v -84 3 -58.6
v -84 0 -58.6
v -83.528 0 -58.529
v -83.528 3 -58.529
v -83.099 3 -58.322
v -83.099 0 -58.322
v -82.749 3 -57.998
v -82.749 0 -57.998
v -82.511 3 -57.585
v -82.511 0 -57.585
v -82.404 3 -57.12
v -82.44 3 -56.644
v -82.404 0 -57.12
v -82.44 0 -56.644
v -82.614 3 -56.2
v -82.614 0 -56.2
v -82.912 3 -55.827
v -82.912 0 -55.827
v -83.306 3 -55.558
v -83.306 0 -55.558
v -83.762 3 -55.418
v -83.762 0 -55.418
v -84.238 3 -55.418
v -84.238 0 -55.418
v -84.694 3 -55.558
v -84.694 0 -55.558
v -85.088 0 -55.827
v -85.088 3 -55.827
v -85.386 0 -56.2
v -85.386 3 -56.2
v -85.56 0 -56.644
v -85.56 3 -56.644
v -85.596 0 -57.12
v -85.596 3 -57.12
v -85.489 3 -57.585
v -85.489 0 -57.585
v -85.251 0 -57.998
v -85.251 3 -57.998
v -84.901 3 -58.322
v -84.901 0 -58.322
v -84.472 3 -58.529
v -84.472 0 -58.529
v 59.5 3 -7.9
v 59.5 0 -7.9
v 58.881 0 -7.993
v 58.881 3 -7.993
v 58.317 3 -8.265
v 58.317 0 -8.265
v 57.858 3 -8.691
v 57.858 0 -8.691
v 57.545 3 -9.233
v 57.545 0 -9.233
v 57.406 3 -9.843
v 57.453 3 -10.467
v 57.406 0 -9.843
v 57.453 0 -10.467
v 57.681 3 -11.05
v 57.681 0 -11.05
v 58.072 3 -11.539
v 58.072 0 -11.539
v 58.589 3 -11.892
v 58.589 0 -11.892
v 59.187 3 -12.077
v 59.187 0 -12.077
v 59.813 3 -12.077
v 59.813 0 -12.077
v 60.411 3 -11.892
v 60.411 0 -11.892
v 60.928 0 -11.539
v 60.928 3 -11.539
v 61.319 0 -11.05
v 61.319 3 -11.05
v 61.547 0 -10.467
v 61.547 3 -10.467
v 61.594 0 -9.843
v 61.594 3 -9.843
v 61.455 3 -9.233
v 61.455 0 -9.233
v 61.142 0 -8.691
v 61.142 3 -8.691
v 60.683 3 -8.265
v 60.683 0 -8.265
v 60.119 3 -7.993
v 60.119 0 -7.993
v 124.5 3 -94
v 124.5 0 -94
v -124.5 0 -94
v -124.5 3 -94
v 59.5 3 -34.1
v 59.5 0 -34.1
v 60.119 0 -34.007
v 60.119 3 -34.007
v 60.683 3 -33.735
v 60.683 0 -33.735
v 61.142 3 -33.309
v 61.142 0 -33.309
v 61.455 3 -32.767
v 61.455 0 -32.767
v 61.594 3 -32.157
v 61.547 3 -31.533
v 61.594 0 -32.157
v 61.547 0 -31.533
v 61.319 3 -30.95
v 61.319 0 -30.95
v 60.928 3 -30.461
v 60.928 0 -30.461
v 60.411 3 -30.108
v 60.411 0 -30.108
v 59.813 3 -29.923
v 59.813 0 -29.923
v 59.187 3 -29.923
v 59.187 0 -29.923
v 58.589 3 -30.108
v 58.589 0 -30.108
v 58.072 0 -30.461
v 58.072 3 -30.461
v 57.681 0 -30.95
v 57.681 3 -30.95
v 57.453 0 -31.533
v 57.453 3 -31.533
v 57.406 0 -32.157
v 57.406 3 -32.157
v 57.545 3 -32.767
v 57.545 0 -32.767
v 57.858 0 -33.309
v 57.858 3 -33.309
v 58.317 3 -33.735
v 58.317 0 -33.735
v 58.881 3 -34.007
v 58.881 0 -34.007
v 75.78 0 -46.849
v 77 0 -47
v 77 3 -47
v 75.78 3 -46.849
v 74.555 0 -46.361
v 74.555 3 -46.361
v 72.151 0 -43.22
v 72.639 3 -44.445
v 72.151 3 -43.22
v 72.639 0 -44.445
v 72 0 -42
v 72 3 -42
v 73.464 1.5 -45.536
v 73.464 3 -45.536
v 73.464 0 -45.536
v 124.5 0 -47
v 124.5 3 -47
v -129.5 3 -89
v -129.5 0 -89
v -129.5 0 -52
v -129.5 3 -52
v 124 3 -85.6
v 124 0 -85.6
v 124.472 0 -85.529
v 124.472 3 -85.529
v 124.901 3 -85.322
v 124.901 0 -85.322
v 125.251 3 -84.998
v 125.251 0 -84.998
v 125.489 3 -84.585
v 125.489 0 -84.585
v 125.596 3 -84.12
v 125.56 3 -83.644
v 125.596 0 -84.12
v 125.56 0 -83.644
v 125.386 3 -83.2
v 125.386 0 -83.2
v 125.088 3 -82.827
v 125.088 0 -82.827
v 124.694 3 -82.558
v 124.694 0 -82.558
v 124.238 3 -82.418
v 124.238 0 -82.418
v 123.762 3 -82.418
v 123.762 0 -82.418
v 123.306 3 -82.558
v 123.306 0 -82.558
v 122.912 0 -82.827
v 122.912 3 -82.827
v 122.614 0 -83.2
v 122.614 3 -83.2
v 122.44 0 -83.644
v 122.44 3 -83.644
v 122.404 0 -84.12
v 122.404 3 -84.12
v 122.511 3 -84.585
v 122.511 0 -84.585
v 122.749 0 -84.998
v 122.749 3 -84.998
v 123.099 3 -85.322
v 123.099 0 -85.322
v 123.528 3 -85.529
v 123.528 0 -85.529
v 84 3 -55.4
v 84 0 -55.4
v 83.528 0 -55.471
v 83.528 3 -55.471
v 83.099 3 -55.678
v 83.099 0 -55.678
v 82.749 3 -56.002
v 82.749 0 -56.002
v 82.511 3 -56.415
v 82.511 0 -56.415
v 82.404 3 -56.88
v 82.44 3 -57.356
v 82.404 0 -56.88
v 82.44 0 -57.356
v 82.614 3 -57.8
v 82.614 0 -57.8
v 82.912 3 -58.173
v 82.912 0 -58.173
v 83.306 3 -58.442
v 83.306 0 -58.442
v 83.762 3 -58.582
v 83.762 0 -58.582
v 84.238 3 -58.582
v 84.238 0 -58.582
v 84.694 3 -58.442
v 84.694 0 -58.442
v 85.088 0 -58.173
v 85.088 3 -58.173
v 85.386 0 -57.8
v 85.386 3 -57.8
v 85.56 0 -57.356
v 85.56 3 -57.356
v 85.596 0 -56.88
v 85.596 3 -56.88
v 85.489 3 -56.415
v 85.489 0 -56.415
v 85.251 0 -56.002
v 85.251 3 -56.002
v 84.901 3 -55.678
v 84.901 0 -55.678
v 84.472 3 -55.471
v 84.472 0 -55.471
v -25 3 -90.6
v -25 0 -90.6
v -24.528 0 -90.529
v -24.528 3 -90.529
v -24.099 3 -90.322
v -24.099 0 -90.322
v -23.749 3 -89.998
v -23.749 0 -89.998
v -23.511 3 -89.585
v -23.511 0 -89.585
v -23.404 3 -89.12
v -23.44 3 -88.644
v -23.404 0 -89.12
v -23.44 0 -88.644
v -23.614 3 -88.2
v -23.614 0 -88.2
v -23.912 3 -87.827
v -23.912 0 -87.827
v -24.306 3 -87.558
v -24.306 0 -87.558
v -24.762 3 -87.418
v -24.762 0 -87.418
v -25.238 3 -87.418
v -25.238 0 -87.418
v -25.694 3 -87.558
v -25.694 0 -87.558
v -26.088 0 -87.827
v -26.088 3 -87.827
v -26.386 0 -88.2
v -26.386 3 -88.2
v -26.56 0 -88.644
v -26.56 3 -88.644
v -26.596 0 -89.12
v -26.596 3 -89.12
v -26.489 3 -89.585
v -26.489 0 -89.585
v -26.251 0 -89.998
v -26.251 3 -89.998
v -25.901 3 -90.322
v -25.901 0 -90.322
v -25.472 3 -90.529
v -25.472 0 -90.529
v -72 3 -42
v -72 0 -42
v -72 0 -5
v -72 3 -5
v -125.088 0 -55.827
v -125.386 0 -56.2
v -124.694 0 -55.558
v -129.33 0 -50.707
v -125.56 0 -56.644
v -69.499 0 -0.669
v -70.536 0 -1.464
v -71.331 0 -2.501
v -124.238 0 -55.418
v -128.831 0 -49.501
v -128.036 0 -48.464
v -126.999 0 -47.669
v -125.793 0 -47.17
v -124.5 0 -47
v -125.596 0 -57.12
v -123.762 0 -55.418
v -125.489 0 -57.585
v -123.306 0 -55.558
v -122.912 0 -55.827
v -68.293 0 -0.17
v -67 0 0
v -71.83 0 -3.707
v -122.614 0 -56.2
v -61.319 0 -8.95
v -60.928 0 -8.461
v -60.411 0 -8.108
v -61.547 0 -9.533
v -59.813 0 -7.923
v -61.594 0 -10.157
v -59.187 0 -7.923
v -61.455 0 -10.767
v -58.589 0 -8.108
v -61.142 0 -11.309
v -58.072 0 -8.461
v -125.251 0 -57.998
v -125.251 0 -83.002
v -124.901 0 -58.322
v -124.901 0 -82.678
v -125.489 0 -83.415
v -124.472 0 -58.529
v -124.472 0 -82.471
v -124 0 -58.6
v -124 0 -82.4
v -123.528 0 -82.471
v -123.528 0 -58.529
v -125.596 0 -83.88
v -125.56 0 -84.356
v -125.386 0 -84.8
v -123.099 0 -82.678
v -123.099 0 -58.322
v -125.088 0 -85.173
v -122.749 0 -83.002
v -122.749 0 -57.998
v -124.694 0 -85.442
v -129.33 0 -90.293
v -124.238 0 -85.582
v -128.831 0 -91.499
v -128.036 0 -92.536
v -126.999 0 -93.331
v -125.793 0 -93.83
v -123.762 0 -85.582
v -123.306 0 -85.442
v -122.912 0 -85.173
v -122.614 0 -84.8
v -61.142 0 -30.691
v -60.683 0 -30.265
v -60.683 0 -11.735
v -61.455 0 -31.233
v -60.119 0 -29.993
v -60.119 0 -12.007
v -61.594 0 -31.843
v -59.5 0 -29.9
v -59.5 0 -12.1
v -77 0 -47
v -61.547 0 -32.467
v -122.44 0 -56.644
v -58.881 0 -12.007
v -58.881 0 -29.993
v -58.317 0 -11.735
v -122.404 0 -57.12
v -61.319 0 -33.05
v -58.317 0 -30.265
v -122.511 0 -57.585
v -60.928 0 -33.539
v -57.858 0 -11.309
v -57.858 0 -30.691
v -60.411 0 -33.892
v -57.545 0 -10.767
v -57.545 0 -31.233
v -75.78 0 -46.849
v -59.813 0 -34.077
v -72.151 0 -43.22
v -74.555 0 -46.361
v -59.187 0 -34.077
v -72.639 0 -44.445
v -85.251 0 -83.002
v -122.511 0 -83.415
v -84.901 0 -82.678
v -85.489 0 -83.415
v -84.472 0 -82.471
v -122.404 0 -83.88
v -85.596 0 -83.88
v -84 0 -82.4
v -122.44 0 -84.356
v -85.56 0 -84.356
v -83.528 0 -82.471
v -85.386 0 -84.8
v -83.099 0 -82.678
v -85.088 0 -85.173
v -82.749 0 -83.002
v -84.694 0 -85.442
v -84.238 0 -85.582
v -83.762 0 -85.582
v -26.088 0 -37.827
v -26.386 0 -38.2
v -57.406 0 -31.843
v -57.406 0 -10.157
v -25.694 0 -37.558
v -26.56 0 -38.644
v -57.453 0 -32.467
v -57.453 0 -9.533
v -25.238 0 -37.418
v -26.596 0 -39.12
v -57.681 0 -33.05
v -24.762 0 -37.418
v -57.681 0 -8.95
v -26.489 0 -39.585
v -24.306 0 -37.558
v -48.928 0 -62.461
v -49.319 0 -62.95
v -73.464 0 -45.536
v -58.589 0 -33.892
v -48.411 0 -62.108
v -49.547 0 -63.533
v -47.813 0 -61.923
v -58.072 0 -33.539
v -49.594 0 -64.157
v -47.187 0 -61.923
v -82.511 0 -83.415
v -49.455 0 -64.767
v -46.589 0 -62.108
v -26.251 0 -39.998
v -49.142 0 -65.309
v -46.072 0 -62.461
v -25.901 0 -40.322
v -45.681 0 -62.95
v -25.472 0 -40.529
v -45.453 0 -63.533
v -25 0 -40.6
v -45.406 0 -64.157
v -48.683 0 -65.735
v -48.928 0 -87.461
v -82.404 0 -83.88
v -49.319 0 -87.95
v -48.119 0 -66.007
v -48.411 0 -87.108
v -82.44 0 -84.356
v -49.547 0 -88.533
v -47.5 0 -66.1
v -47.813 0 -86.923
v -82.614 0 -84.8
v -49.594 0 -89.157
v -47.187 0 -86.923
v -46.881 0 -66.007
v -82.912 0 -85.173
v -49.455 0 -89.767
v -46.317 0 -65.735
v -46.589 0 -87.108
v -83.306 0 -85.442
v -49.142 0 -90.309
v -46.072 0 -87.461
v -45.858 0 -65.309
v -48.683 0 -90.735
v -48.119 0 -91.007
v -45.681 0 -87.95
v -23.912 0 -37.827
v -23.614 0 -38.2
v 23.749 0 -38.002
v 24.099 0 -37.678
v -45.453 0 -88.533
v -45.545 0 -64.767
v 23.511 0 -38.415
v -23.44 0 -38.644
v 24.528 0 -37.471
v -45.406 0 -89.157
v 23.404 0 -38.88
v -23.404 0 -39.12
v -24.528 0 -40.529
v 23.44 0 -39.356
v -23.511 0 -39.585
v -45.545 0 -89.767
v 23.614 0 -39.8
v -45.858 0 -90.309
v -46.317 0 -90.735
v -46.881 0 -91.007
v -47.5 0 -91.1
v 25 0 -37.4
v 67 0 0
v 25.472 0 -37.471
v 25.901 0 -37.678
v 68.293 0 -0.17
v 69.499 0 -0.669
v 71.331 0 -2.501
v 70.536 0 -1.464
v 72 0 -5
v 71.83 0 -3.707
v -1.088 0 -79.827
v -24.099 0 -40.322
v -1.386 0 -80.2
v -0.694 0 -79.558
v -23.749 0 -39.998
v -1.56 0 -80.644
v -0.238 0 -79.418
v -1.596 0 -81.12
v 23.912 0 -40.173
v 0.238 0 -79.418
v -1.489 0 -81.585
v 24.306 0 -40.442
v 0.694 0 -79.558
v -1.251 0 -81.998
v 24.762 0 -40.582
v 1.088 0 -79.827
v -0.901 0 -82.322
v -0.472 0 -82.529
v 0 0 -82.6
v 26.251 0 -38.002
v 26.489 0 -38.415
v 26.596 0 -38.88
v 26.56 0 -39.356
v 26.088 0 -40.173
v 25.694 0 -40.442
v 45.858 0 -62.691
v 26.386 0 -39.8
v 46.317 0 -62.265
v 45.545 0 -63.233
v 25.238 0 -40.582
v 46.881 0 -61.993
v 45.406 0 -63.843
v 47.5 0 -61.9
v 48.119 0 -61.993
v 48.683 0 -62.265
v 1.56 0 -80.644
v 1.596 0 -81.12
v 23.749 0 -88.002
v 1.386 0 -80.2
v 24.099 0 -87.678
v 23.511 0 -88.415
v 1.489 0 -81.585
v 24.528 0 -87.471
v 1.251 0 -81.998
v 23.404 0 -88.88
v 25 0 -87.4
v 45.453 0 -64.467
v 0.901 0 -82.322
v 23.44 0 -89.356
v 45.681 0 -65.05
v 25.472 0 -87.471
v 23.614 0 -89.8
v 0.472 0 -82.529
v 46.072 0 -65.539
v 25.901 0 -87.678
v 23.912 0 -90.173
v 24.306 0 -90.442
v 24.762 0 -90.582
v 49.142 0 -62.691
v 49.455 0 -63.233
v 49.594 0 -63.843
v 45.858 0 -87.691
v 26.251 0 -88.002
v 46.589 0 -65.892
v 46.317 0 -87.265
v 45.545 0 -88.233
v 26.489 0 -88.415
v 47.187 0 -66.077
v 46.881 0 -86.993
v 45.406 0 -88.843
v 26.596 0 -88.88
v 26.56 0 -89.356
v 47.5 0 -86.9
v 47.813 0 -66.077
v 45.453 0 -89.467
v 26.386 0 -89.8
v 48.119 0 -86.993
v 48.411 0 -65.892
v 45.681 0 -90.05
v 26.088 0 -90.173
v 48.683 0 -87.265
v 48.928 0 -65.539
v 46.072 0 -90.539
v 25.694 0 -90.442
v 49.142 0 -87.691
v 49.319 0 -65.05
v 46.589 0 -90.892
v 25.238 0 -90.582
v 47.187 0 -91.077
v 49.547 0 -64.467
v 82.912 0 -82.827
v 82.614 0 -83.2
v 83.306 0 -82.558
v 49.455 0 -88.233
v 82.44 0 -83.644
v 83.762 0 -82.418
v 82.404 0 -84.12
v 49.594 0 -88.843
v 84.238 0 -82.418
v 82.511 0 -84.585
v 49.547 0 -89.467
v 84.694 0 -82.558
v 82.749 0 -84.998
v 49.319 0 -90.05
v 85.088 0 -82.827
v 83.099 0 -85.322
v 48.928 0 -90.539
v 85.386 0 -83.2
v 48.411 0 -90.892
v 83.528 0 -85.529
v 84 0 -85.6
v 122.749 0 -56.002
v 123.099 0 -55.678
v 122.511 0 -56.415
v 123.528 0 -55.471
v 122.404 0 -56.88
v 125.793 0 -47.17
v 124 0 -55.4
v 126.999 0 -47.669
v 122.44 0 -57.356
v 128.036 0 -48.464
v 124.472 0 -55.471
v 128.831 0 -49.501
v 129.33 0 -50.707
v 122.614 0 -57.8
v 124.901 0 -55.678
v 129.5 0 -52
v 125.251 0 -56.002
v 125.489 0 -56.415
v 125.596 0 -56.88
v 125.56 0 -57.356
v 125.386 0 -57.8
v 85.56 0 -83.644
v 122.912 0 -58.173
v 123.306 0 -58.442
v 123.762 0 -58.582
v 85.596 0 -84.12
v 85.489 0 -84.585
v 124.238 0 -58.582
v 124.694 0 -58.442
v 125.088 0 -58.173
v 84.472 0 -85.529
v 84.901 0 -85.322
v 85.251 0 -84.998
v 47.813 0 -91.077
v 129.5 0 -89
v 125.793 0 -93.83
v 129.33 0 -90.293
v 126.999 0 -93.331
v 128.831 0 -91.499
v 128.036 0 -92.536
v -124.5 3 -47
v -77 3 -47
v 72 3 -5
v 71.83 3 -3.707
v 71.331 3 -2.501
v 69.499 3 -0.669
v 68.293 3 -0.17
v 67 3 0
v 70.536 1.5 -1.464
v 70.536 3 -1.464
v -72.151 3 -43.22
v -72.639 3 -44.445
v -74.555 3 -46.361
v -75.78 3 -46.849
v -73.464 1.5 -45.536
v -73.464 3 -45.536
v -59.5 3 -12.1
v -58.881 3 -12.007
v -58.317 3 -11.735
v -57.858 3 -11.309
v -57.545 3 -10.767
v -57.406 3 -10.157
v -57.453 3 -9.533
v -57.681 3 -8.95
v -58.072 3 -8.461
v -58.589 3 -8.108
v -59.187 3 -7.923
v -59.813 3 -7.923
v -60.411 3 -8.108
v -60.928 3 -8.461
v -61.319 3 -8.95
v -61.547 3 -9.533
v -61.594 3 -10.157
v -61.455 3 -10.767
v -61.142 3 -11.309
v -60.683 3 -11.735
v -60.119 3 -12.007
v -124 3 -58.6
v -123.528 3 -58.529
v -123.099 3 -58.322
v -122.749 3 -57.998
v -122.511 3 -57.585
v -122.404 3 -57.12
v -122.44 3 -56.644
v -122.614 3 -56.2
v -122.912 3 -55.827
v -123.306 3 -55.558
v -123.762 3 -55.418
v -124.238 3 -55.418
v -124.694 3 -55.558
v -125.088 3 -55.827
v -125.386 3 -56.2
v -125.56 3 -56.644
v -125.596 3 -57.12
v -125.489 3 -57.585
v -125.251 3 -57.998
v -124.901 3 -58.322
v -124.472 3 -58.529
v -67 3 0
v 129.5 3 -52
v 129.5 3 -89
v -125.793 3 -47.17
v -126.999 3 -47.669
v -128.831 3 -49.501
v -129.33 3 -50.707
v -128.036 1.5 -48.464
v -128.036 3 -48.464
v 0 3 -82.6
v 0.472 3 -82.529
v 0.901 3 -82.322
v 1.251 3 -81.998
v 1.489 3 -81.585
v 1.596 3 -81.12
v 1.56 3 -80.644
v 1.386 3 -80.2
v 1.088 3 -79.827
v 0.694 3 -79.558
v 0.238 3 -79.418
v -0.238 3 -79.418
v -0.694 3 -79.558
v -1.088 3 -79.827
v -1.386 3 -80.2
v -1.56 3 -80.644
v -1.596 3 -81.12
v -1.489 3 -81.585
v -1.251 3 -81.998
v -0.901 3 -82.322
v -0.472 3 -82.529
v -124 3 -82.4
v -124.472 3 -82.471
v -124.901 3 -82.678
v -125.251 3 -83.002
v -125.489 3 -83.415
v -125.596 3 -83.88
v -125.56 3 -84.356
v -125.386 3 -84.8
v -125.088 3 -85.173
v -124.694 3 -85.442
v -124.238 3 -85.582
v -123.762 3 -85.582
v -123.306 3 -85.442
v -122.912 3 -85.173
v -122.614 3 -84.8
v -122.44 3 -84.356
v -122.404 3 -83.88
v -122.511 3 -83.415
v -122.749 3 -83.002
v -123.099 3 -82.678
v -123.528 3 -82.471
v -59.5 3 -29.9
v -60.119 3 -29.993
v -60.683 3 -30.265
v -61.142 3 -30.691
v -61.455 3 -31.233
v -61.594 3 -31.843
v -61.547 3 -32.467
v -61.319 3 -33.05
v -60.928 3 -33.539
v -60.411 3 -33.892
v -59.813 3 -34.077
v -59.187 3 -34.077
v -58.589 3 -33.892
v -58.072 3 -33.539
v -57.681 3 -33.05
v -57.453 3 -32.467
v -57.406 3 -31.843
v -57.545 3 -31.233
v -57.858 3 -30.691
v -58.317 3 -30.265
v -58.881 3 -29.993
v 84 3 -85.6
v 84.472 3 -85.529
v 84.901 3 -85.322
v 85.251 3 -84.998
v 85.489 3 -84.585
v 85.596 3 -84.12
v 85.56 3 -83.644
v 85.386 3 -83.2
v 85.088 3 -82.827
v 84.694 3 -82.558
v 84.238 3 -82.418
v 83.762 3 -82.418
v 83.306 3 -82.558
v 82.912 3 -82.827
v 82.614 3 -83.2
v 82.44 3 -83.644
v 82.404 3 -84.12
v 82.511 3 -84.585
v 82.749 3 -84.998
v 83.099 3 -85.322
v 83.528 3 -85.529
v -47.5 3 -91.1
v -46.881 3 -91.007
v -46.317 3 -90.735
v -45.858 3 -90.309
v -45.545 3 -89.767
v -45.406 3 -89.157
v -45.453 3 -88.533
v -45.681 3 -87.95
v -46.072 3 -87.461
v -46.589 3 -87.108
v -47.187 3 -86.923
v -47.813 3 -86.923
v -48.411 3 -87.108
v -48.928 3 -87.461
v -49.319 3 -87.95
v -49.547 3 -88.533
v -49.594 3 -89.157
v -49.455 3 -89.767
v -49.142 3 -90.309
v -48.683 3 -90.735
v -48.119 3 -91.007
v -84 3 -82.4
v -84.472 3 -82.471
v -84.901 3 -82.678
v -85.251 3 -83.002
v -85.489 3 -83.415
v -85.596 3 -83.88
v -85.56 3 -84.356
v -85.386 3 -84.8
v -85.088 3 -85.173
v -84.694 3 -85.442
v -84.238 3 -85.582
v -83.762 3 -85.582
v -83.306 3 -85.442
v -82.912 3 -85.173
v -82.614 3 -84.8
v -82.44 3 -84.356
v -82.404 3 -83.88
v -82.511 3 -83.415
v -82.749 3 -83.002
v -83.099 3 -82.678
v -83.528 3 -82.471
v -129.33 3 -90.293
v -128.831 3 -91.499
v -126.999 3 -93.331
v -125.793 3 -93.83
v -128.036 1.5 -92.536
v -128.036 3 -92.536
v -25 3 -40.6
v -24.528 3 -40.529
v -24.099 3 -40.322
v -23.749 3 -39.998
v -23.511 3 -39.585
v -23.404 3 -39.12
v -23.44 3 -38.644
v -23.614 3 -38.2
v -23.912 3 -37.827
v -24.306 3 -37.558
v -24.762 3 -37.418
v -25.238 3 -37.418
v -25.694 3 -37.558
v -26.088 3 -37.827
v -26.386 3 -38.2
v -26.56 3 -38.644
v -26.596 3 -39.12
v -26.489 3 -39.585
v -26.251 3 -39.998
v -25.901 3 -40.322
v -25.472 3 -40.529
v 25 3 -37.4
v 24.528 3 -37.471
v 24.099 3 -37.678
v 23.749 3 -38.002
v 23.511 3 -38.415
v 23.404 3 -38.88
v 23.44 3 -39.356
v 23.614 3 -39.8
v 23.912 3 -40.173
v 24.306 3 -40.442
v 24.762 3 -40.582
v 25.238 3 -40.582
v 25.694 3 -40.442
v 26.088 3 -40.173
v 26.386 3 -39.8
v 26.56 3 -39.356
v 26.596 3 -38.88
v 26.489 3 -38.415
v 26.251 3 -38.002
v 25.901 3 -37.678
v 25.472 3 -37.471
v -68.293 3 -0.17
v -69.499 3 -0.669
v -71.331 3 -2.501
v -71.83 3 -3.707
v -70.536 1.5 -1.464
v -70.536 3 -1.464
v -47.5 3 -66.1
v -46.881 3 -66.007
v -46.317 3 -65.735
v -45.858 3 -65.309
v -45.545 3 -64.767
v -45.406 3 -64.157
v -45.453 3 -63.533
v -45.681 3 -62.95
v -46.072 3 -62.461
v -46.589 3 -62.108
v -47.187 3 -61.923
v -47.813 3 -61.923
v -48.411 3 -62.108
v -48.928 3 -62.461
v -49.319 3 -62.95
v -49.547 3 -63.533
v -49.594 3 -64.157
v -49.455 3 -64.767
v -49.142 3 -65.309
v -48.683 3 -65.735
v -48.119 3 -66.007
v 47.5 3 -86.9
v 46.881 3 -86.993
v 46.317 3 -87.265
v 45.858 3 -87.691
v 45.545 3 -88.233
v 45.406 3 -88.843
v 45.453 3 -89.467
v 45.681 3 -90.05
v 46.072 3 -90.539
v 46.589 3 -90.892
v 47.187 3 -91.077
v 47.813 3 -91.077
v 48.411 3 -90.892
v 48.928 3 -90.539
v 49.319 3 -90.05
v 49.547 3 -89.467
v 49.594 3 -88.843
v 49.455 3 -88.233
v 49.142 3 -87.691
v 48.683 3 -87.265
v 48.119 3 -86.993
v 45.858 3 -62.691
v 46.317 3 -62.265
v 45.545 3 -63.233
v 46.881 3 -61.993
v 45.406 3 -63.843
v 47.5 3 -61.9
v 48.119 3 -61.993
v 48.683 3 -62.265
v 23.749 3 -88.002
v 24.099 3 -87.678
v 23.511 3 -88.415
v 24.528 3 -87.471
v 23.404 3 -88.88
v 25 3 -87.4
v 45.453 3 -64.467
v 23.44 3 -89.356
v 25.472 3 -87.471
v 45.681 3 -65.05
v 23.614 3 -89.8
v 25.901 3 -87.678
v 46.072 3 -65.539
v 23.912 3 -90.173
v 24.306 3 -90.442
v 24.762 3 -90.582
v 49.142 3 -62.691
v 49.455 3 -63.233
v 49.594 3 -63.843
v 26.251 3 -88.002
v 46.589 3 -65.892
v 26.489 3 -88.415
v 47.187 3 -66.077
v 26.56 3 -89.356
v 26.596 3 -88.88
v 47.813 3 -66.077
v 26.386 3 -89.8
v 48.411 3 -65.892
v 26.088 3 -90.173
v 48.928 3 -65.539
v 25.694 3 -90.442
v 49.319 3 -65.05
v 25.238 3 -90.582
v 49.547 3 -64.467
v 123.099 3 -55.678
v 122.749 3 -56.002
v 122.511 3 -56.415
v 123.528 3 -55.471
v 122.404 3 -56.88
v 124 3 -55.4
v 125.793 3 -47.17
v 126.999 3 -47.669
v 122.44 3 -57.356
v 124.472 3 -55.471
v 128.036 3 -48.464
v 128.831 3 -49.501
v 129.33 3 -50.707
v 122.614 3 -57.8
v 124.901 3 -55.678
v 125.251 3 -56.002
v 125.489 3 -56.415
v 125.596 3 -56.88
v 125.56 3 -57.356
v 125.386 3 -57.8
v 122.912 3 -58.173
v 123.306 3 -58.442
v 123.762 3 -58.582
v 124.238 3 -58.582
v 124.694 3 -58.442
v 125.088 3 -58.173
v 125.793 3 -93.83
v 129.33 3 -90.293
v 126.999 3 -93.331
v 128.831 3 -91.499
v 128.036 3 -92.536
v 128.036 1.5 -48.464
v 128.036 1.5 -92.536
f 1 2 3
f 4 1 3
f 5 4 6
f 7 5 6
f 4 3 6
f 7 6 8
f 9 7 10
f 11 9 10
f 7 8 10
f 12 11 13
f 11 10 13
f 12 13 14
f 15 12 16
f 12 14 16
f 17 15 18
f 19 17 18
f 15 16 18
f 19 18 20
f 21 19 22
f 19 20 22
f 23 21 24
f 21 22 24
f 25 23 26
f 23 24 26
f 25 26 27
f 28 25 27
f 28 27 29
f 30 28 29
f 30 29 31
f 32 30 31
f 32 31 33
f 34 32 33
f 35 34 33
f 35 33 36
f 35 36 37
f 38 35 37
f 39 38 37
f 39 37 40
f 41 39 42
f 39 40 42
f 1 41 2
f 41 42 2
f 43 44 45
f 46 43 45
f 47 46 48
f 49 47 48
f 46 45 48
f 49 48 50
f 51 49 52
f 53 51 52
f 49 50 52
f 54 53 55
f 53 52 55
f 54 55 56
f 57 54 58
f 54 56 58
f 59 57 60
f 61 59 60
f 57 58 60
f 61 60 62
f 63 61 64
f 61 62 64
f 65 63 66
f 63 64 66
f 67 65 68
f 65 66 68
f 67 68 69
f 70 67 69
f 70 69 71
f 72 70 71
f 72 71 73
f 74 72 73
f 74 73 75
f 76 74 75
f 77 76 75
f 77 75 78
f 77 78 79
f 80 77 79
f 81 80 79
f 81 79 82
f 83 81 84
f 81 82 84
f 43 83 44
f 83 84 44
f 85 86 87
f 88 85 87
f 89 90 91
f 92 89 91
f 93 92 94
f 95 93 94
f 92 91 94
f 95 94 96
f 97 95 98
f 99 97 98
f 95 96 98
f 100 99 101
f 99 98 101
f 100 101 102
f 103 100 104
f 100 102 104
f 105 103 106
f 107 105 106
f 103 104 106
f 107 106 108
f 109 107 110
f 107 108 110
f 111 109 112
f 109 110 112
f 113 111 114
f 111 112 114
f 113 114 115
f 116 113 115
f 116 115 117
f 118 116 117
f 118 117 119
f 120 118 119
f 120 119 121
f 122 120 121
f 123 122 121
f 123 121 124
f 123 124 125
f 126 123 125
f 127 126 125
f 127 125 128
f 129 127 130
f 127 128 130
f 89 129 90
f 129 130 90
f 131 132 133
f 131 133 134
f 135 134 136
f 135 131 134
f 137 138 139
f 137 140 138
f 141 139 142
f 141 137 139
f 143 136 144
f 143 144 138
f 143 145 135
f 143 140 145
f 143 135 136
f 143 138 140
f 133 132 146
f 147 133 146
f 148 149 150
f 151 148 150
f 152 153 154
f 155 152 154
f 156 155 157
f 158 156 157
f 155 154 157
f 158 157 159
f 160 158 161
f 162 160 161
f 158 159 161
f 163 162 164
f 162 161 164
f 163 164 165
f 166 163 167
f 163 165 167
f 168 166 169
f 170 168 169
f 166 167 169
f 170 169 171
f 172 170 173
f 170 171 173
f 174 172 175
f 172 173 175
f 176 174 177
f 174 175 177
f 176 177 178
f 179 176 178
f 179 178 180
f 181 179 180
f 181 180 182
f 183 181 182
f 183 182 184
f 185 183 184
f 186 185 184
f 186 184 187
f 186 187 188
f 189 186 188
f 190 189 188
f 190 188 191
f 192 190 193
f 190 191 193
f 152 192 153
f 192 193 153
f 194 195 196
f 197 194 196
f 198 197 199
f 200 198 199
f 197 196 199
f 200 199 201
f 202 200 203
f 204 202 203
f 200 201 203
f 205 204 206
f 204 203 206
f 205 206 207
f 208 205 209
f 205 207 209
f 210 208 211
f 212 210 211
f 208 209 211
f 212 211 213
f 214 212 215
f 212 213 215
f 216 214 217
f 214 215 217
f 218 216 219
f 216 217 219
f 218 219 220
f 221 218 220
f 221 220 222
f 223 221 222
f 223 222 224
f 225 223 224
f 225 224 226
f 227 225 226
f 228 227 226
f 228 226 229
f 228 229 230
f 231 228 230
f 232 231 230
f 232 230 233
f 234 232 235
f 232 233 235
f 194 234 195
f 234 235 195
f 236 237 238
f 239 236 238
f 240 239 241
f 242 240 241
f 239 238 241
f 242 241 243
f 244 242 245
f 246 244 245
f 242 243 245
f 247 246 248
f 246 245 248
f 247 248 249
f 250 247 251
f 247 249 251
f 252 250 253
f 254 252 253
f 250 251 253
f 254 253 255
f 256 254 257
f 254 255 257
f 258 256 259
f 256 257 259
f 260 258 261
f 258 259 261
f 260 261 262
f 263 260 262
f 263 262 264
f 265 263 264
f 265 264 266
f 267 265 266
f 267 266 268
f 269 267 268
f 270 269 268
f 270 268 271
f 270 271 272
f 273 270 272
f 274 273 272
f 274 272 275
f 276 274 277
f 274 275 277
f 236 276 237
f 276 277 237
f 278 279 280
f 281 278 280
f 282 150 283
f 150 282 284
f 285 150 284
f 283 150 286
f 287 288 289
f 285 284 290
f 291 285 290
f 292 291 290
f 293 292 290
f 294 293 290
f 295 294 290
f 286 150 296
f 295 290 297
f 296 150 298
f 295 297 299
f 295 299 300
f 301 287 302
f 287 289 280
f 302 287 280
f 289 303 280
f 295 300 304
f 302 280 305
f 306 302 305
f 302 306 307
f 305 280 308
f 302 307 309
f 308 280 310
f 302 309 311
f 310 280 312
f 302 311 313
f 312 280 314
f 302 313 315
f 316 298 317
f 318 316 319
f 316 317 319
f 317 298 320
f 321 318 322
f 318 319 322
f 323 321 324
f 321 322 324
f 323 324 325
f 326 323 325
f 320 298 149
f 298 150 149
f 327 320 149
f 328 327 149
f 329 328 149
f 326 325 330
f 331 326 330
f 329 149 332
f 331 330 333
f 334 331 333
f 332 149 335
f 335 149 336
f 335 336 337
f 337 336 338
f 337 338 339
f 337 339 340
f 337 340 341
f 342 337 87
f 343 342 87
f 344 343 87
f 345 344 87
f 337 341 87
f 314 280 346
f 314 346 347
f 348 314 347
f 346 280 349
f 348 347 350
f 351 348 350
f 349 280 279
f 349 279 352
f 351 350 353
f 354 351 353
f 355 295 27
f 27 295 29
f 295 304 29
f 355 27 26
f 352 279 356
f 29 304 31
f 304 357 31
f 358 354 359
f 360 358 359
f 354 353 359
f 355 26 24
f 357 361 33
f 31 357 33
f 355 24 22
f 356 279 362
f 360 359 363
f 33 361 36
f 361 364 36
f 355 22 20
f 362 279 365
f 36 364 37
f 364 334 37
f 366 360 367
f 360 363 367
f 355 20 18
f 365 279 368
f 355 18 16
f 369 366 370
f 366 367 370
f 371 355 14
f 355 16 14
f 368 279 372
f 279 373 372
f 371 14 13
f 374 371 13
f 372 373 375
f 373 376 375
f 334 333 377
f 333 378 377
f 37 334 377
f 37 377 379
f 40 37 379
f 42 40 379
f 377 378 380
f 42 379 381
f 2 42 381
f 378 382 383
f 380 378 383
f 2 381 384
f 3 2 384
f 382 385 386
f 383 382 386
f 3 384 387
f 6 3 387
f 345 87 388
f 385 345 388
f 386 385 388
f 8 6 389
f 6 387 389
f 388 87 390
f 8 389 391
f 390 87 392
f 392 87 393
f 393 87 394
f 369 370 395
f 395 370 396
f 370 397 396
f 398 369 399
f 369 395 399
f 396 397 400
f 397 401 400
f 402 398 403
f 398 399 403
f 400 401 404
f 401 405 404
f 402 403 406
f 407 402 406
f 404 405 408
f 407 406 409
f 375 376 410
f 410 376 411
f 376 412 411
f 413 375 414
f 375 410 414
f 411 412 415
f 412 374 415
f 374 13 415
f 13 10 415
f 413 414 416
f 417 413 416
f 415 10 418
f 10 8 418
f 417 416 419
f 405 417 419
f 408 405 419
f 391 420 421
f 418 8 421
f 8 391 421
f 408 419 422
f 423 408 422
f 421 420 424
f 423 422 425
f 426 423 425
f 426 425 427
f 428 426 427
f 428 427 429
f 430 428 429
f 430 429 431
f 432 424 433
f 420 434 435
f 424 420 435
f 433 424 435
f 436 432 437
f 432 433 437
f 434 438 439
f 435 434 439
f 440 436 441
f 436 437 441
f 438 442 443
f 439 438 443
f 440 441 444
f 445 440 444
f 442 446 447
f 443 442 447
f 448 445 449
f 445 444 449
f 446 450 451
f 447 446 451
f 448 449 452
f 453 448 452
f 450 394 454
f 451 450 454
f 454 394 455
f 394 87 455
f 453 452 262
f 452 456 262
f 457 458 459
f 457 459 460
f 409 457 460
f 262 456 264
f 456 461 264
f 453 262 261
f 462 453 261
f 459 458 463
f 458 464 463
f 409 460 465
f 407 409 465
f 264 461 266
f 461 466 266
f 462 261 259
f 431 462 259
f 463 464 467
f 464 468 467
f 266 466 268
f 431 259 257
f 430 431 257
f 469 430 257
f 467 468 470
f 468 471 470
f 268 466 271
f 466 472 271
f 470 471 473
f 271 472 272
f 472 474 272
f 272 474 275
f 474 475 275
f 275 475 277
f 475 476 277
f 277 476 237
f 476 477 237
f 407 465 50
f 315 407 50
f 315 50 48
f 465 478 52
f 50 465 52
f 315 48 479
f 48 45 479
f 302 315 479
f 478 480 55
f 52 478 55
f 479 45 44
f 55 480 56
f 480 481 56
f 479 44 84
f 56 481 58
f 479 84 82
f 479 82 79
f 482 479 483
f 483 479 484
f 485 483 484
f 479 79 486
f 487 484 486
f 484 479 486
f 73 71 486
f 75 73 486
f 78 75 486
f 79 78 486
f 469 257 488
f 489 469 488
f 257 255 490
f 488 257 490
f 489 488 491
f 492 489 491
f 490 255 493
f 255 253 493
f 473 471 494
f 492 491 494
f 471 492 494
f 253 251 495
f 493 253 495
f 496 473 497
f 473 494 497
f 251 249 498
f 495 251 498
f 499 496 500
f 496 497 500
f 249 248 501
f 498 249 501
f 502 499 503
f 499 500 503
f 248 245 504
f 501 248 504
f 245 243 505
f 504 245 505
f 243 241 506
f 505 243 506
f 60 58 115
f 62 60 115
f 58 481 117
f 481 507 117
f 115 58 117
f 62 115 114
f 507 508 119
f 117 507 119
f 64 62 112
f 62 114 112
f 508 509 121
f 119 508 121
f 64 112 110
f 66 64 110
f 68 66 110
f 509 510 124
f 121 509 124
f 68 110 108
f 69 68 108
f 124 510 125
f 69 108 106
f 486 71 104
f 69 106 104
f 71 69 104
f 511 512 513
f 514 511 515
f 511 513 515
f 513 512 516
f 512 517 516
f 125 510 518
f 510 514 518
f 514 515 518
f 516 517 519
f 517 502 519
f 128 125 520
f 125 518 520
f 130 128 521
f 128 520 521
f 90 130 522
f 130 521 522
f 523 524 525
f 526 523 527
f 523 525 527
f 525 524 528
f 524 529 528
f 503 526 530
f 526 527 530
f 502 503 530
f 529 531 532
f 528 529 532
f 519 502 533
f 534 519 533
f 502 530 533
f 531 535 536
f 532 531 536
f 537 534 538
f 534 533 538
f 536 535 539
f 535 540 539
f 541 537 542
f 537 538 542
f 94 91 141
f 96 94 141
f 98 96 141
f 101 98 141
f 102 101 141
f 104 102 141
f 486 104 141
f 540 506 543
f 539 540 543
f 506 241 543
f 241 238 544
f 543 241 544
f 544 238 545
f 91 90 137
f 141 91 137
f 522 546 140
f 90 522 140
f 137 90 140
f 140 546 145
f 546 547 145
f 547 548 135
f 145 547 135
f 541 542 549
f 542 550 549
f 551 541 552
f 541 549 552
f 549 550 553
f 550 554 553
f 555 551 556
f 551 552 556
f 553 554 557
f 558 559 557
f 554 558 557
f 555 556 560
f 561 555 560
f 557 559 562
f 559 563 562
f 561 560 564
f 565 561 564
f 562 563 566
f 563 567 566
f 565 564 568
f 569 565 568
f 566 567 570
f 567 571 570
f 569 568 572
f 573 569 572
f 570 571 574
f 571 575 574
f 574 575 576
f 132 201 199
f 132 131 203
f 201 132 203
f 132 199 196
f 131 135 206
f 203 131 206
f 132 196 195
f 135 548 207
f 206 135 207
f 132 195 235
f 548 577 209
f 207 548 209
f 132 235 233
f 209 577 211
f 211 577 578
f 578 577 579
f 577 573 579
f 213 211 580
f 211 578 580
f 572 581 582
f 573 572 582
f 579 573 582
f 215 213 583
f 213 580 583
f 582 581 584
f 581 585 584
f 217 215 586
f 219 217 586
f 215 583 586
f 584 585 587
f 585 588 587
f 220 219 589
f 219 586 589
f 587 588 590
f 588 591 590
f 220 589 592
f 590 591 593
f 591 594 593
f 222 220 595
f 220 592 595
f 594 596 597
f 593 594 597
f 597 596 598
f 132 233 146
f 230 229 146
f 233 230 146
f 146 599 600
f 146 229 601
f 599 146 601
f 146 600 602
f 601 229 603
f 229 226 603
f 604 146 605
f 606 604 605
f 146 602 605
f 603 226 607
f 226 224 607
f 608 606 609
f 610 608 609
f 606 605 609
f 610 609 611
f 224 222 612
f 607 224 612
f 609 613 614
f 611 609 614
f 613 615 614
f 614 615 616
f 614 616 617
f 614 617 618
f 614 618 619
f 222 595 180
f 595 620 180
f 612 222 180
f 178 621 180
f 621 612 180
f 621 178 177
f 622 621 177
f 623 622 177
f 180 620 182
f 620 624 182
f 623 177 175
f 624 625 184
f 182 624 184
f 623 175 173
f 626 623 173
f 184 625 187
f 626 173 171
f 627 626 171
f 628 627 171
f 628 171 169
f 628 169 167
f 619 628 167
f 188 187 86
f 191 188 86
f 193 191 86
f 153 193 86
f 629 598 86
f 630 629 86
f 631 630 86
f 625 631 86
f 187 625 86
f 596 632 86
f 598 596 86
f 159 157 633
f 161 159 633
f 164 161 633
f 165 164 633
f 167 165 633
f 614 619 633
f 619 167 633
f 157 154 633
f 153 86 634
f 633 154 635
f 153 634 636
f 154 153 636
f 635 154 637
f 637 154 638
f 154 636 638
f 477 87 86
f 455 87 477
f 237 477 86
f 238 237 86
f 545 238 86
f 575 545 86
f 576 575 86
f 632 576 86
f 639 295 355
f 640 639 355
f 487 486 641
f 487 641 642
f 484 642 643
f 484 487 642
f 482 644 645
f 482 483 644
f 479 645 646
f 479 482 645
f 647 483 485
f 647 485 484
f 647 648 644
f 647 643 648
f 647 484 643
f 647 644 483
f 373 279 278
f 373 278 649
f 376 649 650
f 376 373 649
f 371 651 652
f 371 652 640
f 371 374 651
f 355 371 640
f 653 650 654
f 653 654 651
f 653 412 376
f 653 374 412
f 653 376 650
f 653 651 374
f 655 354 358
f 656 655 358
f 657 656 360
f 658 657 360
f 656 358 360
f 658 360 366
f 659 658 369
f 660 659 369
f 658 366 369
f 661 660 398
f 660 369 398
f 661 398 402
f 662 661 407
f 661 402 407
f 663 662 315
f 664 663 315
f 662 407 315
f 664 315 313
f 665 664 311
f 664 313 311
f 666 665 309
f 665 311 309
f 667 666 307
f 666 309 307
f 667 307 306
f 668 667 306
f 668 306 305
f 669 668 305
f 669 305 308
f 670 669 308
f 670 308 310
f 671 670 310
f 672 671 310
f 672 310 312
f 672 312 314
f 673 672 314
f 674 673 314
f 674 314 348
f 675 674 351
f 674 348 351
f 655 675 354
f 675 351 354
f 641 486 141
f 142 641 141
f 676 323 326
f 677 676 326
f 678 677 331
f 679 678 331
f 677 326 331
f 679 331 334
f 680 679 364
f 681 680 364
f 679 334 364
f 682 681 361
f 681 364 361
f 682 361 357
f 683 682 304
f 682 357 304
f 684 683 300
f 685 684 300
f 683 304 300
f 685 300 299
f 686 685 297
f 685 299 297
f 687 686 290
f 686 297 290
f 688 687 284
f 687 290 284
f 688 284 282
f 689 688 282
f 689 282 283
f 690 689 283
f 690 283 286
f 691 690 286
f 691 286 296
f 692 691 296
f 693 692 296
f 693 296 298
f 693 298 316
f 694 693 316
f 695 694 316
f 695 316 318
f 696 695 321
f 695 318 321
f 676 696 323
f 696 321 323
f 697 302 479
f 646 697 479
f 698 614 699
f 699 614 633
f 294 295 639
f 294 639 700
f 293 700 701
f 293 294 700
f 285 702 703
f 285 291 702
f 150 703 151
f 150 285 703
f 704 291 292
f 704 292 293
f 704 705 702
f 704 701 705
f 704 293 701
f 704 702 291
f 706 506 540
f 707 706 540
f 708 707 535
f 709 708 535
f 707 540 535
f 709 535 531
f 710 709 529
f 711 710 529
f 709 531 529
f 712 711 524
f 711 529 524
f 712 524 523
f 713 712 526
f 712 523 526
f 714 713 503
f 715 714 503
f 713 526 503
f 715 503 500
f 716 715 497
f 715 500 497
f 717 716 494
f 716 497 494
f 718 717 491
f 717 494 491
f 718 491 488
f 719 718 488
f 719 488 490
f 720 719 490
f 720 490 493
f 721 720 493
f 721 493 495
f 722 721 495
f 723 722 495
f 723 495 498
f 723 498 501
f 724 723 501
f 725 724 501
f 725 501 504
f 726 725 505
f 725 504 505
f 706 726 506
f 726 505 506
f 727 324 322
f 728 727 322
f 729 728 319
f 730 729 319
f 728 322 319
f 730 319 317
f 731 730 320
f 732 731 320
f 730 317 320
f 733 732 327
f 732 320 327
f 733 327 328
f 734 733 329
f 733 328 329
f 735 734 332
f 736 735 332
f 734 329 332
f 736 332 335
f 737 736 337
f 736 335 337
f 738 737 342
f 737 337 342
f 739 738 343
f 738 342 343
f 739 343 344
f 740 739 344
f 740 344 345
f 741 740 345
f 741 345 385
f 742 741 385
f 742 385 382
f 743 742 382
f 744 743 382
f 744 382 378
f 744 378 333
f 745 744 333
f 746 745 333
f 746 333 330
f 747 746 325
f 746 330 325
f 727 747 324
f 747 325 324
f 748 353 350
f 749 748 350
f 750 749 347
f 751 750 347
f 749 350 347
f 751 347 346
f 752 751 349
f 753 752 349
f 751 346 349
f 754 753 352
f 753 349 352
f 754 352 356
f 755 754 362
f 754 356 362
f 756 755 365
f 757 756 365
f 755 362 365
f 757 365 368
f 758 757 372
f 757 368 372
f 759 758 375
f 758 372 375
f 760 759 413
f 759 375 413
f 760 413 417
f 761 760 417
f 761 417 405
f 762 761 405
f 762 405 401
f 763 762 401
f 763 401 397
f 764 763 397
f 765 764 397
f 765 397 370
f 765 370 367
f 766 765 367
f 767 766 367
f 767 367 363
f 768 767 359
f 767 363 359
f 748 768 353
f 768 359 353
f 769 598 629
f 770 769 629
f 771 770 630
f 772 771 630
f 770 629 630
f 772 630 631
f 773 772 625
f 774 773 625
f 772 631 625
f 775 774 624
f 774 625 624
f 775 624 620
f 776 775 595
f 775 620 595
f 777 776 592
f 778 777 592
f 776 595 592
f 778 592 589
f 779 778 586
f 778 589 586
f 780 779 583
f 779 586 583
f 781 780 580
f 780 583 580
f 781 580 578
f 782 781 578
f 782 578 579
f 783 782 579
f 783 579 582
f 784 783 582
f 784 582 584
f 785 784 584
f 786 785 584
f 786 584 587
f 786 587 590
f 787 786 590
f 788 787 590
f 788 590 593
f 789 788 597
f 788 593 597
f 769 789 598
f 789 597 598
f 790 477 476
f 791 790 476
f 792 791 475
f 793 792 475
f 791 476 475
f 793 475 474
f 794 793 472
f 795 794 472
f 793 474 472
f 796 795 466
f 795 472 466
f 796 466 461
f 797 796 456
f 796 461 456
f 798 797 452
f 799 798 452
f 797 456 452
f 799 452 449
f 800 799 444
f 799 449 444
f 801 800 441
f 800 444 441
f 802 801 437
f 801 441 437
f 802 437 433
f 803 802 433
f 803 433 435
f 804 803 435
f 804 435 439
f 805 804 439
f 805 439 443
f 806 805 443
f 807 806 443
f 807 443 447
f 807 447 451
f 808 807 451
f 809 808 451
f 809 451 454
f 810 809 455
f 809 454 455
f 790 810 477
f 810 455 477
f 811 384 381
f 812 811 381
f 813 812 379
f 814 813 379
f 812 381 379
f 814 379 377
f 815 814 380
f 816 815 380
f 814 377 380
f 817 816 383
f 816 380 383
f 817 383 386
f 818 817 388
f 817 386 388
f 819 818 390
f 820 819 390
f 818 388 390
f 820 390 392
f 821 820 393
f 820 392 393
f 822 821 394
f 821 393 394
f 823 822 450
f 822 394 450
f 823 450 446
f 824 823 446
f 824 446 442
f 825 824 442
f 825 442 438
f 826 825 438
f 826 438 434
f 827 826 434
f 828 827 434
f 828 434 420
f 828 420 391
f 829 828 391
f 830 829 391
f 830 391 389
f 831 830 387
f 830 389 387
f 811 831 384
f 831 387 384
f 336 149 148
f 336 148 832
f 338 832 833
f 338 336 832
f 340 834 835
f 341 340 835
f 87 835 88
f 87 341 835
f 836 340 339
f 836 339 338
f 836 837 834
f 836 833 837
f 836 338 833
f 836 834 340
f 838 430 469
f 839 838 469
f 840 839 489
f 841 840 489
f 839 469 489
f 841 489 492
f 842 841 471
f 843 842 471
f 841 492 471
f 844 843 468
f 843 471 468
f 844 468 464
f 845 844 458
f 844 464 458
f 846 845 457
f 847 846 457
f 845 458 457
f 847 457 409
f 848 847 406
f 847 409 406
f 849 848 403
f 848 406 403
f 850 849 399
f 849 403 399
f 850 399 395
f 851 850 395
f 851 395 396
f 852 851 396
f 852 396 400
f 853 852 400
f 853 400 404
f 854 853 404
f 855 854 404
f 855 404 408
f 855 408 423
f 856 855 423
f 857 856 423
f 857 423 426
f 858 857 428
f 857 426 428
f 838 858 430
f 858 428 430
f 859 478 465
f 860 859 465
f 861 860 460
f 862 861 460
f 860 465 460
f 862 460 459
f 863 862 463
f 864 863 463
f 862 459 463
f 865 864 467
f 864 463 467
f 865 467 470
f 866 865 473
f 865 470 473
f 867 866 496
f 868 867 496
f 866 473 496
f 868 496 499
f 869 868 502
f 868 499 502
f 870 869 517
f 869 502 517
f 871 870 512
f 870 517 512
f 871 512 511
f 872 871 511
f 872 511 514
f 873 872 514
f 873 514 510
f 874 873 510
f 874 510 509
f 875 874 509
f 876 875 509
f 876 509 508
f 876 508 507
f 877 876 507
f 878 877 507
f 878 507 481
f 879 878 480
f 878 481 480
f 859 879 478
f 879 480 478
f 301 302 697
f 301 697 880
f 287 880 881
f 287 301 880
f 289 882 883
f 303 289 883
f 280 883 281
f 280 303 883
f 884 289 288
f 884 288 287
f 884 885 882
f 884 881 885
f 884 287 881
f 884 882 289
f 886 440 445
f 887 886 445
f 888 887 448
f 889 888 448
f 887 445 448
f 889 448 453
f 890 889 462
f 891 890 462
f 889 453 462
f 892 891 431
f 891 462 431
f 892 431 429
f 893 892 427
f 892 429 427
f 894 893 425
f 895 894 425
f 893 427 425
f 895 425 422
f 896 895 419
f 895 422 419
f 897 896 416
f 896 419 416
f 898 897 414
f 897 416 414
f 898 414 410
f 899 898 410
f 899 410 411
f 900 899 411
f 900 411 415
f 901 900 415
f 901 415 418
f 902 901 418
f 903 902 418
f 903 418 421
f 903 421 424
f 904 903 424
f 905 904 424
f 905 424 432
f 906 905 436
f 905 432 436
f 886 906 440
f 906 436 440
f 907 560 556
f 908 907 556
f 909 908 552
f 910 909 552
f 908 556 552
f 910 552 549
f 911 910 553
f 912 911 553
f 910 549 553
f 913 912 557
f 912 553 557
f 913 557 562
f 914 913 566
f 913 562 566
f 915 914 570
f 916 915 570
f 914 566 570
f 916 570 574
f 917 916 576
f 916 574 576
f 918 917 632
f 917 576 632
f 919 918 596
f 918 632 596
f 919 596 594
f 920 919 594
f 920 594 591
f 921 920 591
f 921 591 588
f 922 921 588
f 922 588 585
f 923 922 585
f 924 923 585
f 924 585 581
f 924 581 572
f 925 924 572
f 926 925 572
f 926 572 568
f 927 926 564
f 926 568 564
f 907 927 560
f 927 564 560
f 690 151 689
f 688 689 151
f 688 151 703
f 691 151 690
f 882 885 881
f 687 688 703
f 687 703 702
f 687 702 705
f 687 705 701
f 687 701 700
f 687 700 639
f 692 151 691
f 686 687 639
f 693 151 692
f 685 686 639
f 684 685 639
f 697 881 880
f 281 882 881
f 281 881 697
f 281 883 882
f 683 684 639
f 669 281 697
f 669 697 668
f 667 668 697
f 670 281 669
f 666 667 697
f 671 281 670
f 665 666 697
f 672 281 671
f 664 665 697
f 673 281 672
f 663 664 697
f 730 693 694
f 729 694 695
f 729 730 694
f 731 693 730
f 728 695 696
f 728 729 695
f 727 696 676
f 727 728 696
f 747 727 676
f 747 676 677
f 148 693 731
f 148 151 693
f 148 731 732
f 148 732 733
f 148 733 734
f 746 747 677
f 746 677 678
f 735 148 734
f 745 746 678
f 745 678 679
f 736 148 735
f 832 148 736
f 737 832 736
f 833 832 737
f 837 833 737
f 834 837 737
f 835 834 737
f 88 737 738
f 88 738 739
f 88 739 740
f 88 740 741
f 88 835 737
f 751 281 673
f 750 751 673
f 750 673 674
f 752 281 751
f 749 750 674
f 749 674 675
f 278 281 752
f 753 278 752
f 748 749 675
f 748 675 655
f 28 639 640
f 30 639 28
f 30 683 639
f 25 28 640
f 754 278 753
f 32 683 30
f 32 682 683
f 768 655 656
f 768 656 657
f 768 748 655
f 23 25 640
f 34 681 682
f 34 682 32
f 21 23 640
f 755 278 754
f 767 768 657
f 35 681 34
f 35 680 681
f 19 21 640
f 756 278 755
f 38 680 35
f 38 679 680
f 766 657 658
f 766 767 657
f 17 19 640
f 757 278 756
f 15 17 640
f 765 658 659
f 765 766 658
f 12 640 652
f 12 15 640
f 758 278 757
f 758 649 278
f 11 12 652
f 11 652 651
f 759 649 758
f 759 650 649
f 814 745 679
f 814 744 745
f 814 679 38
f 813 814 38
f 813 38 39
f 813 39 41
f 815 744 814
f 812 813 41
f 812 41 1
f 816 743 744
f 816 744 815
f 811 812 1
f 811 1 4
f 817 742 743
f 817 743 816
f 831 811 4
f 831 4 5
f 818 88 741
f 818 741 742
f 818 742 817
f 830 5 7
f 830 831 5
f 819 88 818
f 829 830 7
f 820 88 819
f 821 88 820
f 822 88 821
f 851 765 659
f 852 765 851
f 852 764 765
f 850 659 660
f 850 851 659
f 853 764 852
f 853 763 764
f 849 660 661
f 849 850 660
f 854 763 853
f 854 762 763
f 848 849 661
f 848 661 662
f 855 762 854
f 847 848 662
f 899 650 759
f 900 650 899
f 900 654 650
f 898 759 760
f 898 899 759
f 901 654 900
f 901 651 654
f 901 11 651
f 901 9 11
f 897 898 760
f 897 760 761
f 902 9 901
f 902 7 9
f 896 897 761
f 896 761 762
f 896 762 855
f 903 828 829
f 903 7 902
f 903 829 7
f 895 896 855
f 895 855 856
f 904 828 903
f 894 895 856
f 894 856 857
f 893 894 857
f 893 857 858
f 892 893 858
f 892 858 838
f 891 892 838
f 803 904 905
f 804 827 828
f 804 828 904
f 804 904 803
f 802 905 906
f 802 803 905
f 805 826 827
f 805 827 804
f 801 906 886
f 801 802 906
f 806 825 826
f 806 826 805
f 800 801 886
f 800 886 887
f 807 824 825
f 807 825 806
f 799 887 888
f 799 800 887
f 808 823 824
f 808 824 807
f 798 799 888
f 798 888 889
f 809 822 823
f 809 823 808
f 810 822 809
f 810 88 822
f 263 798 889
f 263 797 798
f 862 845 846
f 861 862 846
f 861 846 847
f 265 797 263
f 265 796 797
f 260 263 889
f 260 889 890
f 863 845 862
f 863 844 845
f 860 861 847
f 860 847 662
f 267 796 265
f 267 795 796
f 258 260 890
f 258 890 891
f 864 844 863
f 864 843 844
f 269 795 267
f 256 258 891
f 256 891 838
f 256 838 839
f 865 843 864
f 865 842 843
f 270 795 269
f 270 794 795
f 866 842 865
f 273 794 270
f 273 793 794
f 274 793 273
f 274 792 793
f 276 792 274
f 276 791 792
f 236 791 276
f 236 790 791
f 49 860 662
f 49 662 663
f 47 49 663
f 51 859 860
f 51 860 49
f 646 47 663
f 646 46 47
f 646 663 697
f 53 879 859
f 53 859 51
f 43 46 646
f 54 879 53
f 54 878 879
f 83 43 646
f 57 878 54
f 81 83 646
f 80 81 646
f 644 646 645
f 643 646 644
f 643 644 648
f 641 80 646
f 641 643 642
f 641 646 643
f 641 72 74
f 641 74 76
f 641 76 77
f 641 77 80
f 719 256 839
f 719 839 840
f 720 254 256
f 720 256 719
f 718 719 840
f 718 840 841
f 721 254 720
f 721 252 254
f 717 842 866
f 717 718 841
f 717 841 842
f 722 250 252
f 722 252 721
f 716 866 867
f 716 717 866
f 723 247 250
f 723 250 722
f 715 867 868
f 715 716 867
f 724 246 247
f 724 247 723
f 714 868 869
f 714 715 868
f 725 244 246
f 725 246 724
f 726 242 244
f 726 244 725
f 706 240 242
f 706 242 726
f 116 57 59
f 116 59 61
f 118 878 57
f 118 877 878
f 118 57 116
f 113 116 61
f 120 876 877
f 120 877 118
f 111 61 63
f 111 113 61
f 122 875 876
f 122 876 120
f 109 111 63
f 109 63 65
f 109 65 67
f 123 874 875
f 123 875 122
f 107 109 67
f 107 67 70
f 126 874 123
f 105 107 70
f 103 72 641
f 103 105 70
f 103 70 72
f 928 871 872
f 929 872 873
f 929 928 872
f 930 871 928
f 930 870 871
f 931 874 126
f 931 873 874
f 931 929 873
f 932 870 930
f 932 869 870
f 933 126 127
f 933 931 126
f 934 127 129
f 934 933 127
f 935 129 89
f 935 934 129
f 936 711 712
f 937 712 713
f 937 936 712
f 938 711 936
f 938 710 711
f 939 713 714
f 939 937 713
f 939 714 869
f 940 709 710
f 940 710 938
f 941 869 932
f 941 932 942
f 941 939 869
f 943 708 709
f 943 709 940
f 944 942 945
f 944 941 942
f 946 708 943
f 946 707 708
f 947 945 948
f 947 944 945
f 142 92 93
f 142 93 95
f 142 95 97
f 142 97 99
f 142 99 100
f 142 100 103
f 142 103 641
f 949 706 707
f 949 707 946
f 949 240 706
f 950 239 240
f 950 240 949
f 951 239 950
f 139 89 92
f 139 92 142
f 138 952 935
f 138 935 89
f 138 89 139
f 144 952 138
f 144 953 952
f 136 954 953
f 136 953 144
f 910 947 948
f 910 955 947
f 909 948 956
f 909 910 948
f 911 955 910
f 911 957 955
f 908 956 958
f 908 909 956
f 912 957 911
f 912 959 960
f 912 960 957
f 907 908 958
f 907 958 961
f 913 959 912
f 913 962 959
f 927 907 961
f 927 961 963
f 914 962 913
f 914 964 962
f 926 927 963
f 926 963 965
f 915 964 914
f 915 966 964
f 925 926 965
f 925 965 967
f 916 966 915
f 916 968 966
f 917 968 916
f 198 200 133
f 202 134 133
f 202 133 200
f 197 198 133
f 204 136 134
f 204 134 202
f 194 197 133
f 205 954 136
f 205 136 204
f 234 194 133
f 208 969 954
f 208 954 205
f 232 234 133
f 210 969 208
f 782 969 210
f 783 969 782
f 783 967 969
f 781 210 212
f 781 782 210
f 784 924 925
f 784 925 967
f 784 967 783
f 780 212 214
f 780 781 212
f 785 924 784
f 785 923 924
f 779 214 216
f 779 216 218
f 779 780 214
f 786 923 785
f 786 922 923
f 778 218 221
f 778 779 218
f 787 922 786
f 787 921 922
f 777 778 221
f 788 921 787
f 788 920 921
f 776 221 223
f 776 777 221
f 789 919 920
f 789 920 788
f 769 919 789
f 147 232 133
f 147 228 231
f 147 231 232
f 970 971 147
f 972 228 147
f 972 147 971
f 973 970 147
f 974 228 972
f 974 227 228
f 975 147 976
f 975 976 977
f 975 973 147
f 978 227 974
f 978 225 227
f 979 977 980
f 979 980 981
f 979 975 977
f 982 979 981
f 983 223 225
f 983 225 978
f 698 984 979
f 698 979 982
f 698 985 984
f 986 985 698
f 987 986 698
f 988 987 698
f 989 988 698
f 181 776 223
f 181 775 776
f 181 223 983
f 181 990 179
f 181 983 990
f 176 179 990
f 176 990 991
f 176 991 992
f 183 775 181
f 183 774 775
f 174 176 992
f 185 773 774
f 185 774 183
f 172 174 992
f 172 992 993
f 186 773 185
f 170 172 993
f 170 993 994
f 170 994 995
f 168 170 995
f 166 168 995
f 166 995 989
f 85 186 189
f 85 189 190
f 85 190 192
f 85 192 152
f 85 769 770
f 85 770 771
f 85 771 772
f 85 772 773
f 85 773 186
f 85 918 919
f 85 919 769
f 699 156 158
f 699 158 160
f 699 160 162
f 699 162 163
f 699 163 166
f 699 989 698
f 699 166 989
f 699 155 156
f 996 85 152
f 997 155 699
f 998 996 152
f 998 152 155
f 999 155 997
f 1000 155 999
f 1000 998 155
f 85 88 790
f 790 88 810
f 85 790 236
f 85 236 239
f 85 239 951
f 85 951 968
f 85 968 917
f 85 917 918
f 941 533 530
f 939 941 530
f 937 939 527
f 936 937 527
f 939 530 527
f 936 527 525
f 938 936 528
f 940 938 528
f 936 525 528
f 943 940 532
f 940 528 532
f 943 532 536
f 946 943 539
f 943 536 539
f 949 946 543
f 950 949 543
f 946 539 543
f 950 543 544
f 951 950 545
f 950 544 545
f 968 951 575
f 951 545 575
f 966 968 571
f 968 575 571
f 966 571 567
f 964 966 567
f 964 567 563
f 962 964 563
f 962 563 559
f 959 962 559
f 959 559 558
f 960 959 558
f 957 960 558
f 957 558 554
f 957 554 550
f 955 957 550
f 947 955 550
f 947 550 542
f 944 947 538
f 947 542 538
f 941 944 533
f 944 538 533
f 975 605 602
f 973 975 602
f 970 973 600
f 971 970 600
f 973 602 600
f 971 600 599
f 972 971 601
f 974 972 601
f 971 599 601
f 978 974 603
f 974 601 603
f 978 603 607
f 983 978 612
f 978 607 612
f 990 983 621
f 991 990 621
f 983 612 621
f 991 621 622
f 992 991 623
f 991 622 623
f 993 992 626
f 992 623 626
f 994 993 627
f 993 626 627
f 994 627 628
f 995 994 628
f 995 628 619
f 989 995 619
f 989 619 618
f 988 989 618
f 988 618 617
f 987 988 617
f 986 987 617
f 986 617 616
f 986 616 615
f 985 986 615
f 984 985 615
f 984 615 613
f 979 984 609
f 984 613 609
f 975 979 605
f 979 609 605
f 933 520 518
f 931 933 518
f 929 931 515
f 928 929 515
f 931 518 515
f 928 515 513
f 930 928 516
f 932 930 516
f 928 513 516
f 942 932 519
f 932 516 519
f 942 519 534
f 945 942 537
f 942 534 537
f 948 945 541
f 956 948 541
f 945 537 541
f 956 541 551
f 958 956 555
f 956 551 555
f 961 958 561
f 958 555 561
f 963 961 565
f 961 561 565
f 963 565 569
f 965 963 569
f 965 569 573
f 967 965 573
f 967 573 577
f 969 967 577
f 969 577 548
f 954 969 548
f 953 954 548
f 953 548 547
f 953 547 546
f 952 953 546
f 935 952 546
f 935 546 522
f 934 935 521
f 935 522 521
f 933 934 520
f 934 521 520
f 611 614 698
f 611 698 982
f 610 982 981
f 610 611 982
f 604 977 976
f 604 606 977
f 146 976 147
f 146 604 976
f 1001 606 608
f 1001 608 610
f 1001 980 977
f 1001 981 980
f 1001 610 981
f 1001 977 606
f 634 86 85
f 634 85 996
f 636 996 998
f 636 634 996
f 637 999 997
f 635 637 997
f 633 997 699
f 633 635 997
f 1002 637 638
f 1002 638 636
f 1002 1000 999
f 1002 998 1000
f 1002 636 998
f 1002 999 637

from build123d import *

# Parameters (mm, degrees)
SKETCH_1_R      = 2.1
SKETCH_1_R_2    = 1.6
EXTRUDE_1_DEPTH = 3
FILLET_1_R      = 5


with BuildPart() as part:
    # 草图1 → 凸台-拉伸1 (new body)
    with BuildSketch(Plane.XZ):
        Polygon((-72, 0), (72, 0), (72, -47), (129.5, -47), (129.5, -94), (-129.5, -94), (-129.5, -47), (-72, -47), align=None)
        with Locations((47.5, -89)):
            Circle(SKETCH_1_R, mode=Mode.SUBTRACT)
        with Locations((-124, -84)):
            Circle(SKETCH_1_R_2, mode=Mode.SUBTRACT)
        with Locations((-25, -89)):
            Circle(SKETCH_1_R_2, mode=Mode.SUBTRACT)
        with Locations((-59.5, -32)):
            Circle(SKETCH_1_R, mode=Mode.SUBTRACT)
        with Locations((-25, -39)):
            Circle(SKETCH_1_R_2, mode=Mode.SUBTRACT)
        with Locations((84, -84)):
            Circle(SKETCH_1_R_2, mode=Mode.SUBTRACT)
        with Locations((-59.5, -10)):
            Circle(SKETCH_1_R, mode=Mode.SUBTRACT)
        with Locations((47.5, -64)):
            Circle(SKETCH_1_R, mode=Mode.SUBTRACT)
        with Locations((-84, -57)):
            Circle(SKETCH_1_R_2, mode=Mode.SUBTRACT)
        with Locations((-124, -57)):
            Circle(SKETCH_1_R_2, mode=Mode.SUBTRACT)
        with Locations((-47.5, -64)):
            Circle(SKETCH_1_R, mode=Mode.SUBTRACT)
        with Locations((-84, -84)):
            Circle(SKETCH_1_R_2, mode=Mode.SUBTRACT)
        with Locations((124, -57)):
            Circle(SKETCH_1_R_2, mode=Mode.SUBTRACT)
        with Locations((84, -57)):
            Circle(SKETCH_1_R_2, mode=Mode.SUBTRACT)
        with Locations((59.5, -10)):
            Circle(SKETCH_1_R, mode=Mode.SUBTRACT)
        with Locations((25, -39)):
            Circle(SKETCH_1_R_2, mode=Mode.SUBTRACT)
        with Locations((59.5, -32)):
            Circle(SKETCH_1_R, mode=Mode.SUBTRACT)
        with Locations((25, -89)):
            Circle(SKETCH_1_R_2, mode=Mode.SUBTRACT)
        with Locations((124, -84)):
            Circle(SKETCH_1_R_2, mode=Mode.SUBTRACT)
        with Locations((0, -81)):
            Circle(SKETCH_1_R_2, mode=Mode.SUBTRACT)
        with Locations((-47.5, -89)):
            Circle(SKETCH_1_R, mode=Mode.SUBTRACT)
    extrude(amount=-EXTRUDE_1_DEPTH)

    # 圆角1
    fillet_1_edges = [part.edges().sort_by_distance(p)[0] for p in [
        (72, 1.5, 0),
        (72, 1.5, -47),
        (129.5, 1.5, -47),
        (129.5, 1.5, -94),
        (-129.5, 1.5, -94),
        (-129.5, 1.5, -47),
        (-72, 1.5, -47),
        (-72, 1.5, 0),
    ]]
    fillet(fillet_1_edges, radius=FILLET_1_R)


solid = part.part
